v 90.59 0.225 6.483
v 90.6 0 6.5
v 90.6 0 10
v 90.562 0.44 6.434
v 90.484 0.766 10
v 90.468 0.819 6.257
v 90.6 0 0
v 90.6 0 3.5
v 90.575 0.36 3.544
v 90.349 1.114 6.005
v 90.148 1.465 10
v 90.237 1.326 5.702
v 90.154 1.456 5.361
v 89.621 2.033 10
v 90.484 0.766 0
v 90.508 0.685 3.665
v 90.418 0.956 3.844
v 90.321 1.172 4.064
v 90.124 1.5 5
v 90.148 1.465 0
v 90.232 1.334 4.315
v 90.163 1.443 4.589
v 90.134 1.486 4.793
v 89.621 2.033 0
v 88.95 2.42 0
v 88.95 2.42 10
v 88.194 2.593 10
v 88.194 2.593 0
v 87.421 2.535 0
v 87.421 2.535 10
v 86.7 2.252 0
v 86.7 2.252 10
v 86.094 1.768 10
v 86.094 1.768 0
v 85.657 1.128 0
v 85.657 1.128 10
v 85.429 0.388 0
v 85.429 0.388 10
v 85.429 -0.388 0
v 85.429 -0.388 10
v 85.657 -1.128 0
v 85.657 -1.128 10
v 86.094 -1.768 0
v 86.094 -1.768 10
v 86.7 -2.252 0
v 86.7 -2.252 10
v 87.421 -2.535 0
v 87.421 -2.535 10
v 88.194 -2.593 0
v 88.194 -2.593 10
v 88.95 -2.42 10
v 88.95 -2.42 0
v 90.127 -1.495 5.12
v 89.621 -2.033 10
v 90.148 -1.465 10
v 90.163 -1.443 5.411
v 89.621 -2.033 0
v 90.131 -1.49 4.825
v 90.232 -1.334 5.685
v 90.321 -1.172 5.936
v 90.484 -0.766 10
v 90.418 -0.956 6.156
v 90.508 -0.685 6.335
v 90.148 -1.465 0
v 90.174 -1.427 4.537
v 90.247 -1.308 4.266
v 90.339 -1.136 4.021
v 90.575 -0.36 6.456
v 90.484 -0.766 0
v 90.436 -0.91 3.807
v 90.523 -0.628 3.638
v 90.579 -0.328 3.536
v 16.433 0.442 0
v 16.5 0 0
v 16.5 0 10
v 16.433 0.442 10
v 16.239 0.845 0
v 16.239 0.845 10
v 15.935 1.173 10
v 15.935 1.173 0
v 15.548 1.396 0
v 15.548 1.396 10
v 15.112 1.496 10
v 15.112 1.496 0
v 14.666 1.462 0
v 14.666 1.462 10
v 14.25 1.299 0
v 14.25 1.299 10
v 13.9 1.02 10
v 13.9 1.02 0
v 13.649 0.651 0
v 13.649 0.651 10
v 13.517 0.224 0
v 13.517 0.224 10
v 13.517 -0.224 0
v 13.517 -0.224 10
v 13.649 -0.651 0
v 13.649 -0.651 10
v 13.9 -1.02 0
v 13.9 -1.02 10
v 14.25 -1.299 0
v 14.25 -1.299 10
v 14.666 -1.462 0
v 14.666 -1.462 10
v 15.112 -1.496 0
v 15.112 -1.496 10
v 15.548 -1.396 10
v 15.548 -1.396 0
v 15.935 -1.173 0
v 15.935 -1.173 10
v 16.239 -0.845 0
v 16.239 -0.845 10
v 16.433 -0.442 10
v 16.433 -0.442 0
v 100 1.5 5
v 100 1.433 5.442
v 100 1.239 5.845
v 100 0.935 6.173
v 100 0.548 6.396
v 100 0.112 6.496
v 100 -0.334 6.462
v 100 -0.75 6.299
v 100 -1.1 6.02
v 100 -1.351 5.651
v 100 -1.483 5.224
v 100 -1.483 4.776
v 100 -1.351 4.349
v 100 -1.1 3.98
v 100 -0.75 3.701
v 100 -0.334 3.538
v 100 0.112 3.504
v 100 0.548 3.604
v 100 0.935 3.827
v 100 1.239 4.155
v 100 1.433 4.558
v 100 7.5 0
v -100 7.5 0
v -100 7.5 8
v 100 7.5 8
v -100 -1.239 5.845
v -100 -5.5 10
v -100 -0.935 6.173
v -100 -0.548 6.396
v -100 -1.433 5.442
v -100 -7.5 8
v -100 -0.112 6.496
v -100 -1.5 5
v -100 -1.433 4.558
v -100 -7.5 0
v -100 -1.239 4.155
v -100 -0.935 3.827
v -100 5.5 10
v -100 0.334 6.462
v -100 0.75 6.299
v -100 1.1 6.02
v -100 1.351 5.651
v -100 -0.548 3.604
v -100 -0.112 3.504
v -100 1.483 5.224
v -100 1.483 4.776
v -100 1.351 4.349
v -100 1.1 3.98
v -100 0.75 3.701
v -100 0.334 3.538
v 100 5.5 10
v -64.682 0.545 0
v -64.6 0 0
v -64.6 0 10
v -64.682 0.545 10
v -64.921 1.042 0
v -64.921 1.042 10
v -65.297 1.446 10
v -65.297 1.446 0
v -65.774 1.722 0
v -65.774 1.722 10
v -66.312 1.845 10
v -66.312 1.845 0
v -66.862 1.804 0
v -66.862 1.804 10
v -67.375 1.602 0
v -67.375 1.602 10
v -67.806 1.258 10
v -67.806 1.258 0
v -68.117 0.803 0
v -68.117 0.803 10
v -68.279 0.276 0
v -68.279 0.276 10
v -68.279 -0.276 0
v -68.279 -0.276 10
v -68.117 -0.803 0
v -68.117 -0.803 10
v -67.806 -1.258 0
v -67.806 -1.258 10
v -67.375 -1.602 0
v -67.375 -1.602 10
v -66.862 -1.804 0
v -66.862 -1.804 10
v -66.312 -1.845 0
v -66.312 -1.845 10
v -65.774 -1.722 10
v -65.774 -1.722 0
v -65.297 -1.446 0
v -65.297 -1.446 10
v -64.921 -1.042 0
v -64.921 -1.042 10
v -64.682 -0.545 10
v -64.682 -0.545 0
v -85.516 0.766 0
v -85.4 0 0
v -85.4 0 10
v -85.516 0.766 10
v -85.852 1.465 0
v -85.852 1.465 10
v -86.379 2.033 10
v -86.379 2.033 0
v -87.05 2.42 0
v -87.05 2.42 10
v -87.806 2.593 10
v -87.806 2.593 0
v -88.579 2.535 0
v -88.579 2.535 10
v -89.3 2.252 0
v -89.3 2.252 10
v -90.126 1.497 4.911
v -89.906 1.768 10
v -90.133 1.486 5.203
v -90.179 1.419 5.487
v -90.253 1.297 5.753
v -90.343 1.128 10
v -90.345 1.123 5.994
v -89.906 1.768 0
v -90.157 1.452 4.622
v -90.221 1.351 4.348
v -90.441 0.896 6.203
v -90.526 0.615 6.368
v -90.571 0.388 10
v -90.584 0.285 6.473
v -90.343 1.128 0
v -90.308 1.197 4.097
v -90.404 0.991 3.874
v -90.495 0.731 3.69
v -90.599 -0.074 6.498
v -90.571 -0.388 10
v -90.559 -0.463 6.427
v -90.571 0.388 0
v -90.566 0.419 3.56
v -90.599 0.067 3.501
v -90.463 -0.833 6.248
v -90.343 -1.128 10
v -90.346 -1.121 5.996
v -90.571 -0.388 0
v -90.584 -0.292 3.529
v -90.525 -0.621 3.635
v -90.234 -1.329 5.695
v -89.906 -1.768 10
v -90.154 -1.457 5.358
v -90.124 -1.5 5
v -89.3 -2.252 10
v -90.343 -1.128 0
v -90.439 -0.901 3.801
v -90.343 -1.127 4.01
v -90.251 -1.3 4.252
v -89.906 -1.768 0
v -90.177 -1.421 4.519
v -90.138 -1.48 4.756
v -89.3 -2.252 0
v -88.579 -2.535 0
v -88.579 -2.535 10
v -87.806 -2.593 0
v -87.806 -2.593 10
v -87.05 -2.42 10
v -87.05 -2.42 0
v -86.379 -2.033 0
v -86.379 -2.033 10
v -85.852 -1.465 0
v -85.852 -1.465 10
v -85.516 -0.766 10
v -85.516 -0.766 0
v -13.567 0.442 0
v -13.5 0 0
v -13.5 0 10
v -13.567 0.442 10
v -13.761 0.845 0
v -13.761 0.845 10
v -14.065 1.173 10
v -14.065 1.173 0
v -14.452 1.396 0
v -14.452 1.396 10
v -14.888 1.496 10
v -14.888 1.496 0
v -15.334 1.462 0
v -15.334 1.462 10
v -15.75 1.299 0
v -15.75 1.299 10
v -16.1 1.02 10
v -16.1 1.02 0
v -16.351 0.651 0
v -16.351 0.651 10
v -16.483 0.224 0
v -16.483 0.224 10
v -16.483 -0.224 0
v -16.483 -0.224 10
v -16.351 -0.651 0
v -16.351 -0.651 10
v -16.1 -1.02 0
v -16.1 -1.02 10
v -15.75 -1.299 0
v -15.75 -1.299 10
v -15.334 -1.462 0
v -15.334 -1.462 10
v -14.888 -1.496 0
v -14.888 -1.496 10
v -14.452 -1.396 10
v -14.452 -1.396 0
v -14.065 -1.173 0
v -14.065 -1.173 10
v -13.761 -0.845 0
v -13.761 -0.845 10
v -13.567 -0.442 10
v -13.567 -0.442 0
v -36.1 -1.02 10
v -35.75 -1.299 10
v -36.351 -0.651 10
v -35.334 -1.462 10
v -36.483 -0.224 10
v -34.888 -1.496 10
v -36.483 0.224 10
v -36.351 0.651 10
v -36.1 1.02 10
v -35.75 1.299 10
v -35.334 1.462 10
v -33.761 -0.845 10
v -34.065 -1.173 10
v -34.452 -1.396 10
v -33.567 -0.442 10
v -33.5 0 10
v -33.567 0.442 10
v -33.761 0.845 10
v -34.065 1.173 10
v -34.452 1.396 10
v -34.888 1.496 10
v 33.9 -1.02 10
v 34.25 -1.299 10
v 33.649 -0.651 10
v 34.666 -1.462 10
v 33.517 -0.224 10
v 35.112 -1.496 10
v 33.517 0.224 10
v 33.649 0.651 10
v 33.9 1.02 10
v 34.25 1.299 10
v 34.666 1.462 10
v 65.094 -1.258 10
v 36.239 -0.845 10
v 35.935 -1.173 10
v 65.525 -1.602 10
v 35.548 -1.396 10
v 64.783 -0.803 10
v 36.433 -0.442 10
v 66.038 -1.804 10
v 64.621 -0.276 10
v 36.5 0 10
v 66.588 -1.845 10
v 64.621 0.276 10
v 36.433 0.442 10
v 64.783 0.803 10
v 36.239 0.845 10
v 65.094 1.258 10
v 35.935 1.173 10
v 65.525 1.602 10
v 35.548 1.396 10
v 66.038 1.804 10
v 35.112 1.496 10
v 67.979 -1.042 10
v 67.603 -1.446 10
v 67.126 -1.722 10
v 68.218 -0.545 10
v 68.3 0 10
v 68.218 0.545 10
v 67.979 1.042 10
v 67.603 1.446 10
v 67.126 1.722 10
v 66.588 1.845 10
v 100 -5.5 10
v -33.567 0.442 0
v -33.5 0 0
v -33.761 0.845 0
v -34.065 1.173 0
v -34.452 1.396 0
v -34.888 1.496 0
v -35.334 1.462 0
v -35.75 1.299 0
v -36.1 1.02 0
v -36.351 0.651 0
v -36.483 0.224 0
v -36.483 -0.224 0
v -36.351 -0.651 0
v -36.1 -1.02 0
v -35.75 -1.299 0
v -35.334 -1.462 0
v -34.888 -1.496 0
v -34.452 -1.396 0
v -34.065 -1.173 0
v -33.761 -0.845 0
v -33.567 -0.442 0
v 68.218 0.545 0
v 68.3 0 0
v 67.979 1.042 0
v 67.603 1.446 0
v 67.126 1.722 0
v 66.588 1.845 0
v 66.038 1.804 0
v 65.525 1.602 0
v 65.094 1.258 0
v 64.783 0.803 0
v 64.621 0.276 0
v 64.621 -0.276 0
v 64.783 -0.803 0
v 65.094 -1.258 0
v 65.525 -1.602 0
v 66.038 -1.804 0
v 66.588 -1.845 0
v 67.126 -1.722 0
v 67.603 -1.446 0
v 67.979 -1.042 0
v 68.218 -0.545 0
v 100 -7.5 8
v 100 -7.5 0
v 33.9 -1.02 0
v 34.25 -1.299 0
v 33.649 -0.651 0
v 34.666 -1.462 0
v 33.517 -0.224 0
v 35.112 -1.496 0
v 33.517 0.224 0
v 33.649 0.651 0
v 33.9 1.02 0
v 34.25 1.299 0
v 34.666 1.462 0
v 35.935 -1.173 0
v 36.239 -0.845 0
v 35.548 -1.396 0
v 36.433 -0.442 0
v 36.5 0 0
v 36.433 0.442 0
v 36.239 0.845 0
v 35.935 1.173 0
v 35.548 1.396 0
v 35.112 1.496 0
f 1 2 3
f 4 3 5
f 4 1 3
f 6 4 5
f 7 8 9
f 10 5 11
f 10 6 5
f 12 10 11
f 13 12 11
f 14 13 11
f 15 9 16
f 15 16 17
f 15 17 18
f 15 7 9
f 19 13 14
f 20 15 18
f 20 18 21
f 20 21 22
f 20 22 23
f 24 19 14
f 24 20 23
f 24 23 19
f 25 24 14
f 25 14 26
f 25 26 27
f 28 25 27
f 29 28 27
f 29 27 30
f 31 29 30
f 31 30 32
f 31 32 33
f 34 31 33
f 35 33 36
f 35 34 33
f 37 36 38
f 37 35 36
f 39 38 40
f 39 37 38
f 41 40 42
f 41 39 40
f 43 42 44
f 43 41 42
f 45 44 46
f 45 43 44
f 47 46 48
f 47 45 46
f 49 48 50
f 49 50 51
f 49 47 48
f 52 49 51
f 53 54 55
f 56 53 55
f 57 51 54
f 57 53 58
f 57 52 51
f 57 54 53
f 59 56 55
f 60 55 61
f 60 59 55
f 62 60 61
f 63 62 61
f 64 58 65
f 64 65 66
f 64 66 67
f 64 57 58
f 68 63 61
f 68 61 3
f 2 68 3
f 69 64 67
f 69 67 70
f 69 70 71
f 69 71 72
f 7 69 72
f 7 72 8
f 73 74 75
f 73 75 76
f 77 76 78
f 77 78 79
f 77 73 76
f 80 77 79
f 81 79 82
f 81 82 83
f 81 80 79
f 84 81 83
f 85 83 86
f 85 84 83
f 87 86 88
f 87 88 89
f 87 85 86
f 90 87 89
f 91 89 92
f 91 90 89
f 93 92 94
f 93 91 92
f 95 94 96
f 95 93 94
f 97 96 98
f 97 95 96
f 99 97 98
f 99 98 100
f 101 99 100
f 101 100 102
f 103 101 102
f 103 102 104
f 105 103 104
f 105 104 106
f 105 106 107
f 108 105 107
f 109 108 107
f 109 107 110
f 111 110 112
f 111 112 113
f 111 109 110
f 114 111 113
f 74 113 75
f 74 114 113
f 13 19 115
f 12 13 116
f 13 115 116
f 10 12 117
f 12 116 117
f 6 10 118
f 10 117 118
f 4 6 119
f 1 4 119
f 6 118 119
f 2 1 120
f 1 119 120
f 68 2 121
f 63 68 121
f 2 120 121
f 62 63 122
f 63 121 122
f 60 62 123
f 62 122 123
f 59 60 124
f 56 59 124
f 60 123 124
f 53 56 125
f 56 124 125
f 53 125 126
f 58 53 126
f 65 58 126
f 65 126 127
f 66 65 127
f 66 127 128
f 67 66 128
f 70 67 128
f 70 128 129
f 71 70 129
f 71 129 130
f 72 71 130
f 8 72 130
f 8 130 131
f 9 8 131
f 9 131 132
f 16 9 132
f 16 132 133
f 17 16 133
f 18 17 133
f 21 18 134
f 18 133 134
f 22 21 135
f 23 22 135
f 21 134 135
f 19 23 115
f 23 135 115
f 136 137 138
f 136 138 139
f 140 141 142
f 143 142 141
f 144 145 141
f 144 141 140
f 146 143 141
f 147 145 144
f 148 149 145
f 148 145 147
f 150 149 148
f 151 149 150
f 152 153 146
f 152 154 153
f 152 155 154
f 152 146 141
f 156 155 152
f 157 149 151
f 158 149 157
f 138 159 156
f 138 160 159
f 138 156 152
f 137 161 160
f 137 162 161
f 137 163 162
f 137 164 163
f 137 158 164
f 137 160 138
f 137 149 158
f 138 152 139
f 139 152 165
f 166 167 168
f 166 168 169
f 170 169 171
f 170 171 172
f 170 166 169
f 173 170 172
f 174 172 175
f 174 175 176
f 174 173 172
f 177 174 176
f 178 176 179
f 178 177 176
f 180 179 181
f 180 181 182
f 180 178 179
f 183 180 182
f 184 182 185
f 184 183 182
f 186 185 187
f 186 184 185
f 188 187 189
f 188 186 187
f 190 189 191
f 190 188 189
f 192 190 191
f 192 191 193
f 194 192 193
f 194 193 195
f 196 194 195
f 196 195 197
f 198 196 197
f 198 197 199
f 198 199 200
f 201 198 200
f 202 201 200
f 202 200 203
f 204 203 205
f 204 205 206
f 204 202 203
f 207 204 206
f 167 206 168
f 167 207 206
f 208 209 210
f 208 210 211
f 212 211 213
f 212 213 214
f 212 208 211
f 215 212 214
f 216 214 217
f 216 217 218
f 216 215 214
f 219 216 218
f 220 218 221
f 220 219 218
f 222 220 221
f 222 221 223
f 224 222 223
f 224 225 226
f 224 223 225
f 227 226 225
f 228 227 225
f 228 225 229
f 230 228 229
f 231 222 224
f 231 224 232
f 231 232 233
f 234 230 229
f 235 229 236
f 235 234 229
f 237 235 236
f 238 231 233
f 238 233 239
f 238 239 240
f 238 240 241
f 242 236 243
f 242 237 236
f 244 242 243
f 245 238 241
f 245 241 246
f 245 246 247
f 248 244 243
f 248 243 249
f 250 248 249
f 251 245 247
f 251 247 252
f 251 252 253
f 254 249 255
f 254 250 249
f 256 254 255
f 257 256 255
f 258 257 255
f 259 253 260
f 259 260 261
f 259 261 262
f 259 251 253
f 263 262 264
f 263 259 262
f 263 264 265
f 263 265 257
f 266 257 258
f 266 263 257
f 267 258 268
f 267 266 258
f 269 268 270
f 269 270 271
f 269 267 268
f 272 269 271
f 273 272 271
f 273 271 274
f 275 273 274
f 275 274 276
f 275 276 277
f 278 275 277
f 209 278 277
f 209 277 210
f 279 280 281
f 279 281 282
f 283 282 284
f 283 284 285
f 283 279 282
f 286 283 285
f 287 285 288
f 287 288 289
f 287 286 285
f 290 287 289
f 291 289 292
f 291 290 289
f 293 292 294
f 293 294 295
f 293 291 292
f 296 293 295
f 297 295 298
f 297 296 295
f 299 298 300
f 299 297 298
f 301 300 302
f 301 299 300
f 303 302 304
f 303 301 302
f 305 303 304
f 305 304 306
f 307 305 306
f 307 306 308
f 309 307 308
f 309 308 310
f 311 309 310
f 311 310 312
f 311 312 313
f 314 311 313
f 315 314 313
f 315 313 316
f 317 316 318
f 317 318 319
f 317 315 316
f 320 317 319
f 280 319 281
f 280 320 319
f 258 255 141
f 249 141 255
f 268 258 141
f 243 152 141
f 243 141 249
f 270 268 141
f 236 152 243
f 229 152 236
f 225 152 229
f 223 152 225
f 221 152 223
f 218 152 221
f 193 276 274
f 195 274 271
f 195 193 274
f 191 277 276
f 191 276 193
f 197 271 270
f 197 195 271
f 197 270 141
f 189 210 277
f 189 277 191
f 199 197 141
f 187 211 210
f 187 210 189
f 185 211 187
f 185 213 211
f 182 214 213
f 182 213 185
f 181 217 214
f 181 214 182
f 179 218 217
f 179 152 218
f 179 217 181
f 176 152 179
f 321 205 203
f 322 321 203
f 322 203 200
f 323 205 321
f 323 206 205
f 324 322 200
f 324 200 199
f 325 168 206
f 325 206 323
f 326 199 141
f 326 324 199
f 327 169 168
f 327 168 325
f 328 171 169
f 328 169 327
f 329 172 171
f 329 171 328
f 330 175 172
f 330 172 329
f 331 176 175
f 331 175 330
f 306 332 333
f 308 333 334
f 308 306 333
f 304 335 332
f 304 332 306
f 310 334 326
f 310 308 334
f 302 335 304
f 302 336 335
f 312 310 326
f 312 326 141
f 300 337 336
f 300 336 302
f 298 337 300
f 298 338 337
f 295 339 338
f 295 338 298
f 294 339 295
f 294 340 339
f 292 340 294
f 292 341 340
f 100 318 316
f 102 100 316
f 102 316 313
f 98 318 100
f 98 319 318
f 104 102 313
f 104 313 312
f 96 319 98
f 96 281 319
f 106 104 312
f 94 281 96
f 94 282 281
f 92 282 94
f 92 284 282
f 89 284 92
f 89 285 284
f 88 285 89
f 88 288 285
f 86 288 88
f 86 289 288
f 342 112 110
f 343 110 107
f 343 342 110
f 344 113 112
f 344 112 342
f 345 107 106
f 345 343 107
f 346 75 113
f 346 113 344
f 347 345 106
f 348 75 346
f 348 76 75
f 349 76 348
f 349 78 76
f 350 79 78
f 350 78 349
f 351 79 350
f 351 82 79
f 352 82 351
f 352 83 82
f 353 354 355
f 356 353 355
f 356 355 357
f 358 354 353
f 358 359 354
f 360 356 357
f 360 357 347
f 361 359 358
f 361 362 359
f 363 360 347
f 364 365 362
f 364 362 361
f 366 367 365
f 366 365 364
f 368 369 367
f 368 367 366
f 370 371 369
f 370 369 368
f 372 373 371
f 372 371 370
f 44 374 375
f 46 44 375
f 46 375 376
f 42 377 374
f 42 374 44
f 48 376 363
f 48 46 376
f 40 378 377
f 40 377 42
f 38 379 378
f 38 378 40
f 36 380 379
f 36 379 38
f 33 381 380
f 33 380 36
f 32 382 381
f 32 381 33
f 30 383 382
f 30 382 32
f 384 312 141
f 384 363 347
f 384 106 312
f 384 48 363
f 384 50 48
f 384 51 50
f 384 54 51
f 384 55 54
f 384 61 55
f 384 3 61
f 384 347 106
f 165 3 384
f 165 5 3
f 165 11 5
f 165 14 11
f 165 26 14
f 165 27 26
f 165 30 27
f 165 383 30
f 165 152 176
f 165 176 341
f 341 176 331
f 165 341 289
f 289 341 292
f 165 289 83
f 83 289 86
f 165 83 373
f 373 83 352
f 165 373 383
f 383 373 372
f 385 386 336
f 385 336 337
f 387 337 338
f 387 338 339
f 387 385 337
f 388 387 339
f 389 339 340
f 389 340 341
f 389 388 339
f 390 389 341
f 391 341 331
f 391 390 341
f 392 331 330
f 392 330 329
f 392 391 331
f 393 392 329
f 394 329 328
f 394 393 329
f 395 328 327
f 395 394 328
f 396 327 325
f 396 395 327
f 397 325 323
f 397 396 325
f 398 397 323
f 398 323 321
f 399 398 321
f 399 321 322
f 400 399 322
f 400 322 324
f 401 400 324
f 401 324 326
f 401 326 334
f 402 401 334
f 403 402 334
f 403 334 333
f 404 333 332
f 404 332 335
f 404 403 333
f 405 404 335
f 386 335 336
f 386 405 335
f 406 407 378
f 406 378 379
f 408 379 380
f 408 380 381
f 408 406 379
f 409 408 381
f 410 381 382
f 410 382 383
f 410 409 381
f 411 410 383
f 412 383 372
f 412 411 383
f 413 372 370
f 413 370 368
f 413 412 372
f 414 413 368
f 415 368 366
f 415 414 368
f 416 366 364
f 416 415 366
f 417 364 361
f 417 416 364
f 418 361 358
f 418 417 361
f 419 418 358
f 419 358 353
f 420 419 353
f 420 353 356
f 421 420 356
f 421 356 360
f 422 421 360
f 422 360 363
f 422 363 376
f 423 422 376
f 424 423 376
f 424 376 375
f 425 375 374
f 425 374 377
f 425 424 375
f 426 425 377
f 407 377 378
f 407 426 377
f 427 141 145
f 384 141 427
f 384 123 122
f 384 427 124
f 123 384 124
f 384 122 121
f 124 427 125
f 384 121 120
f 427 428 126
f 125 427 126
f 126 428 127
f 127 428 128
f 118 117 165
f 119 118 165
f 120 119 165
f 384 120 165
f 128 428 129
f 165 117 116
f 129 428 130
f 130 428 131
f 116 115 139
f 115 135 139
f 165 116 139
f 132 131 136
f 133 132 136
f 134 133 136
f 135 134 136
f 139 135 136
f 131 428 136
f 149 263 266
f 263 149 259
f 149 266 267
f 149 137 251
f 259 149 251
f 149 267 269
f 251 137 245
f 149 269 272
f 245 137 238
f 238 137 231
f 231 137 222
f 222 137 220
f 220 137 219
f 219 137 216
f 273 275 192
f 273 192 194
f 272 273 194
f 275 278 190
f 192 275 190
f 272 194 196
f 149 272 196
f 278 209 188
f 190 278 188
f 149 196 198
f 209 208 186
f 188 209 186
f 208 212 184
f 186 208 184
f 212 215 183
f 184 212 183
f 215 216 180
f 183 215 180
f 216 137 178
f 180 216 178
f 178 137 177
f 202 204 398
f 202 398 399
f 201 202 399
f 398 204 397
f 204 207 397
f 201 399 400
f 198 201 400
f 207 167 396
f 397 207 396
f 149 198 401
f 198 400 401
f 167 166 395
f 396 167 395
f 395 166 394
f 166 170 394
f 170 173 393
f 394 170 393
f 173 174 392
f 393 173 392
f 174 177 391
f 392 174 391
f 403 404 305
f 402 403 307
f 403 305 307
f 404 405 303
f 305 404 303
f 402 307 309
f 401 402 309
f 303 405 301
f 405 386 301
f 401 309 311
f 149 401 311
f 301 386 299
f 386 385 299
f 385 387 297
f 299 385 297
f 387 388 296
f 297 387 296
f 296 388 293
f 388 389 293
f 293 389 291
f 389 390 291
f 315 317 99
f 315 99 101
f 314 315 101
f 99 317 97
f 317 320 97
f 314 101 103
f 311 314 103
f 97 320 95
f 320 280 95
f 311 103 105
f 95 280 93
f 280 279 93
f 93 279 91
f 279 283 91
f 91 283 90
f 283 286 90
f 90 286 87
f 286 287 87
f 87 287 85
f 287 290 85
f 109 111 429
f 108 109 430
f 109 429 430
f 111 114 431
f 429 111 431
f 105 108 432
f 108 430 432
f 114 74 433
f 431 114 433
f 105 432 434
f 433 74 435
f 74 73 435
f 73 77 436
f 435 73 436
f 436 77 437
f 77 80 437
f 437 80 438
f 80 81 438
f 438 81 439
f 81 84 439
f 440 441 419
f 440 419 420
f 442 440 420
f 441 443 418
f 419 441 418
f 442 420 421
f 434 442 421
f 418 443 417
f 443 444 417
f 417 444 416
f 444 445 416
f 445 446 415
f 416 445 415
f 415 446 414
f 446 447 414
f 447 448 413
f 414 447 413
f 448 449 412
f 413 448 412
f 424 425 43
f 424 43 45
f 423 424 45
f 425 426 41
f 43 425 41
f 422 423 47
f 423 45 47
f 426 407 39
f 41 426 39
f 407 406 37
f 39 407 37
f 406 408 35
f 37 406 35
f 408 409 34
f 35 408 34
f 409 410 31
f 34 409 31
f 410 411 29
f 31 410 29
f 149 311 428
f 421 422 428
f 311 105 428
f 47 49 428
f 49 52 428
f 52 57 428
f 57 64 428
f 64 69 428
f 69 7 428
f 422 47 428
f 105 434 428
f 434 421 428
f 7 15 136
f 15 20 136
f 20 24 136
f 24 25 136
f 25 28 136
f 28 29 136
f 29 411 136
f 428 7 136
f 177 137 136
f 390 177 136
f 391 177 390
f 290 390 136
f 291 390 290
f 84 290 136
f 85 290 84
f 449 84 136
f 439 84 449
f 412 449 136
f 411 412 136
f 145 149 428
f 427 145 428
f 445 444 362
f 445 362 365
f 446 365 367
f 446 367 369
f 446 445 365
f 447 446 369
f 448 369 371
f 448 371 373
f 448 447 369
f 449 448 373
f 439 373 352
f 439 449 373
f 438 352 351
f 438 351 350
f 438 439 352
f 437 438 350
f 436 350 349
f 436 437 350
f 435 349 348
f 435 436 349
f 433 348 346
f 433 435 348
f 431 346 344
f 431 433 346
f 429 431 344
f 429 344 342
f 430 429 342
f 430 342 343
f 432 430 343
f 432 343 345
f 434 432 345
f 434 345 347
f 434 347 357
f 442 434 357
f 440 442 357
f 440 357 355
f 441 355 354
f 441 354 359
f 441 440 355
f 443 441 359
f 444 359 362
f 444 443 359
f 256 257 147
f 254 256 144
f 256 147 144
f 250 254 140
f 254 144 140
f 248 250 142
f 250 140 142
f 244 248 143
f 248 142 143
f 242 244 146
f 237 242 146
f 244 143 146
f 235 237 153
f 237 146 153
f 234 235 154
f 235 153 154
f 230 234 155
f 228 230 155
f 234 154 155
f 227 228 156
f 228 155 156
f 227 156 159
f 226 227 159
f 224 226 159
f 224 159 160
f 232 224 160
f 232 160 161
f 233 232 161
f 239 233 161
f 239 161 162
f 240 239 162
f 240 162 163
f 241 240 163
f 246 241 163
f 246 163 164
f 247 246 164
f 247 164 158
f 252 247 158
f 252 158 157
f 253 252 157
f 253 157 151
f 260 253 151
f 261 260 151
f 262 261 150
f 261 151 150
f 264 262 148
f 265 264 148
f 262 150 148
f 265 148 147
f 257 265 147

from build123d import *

# Parameters (mm, degrees)
F0_W     = 200
F0_H     = 15
F0_R     = 2.6
F0_R_2   = 1.85
F0_R_3   = 1.5
F1_DEPTH = 10
F2_SIZE  = 2
F3_R     = 1.5
F4_DEPTH = 10
F5_R     = 1.5
F6_DEPTH = 10


with BuildPart() as f1:
    # F0 (on Top) → F1 (new body)
    with BuildSketch(Plane.XY):
        Rectangle(F0_W, F0_H)
        with Locations((-88, 0)):
            Circle(F0_R, mode=Mode.SUBTRACT)
        with Locations((-66.45, 0)):
            Circle(F0_R_2, mode=Mode.SUBTRACT)
        with Locations((-35, 0)):
            Circle(F0_R_3, mode=Mode.SUBTRACT)
        with Locations((-15, 0)):
            Circle(F0_R_3, mode=Mode.SUBTRACT)
        with Locations((15, 0)):
            Circle(F0_R_3, mode=Mode.SUBTRACT)
        with Locations((35, 0)):
            Circle(F0_R_3, mode=Mode.SUBTRACT)
        with Locations((66.45, 0)):
            Circle(F0_R_2, mode=Mode.SUBTRACT)
        with Locations((88, 0)):
            Circle(F0_R, mode=Mode.SUBTRACT)
    extrude(amount=F1_DEPTH)

    # F2
    f2_edges = [f1.edges().sort_by_distance(p)[0] for p in [
        (0, 7.5, 10),
        (0, -7.5, 10),
    ]]
    chamfer(f2_edges, length=F2_SIZE)

    # F3 (on face) → F4 (cut)
    with BuildSketch(Plane.YZ.offset(100)):
        with Locations((0, 5)):
            Circle(F3_R)
    extrude(amount=-F4_DEPTH, mode=Mode.SUBTRACT)

    # F5 (on face) → F6 (cut)
    with BuildSketch(Plane(origin=(-100, 0, 0), x_dir=(0, -1, 0), z_dir=(-1, 0, 0))):
        with Locations((0, 5)):
            Circle(F5_R)
    extrude(amount=-F6_DEPTH, mode=Mode.SUBTRACT)


solid = f1.part
